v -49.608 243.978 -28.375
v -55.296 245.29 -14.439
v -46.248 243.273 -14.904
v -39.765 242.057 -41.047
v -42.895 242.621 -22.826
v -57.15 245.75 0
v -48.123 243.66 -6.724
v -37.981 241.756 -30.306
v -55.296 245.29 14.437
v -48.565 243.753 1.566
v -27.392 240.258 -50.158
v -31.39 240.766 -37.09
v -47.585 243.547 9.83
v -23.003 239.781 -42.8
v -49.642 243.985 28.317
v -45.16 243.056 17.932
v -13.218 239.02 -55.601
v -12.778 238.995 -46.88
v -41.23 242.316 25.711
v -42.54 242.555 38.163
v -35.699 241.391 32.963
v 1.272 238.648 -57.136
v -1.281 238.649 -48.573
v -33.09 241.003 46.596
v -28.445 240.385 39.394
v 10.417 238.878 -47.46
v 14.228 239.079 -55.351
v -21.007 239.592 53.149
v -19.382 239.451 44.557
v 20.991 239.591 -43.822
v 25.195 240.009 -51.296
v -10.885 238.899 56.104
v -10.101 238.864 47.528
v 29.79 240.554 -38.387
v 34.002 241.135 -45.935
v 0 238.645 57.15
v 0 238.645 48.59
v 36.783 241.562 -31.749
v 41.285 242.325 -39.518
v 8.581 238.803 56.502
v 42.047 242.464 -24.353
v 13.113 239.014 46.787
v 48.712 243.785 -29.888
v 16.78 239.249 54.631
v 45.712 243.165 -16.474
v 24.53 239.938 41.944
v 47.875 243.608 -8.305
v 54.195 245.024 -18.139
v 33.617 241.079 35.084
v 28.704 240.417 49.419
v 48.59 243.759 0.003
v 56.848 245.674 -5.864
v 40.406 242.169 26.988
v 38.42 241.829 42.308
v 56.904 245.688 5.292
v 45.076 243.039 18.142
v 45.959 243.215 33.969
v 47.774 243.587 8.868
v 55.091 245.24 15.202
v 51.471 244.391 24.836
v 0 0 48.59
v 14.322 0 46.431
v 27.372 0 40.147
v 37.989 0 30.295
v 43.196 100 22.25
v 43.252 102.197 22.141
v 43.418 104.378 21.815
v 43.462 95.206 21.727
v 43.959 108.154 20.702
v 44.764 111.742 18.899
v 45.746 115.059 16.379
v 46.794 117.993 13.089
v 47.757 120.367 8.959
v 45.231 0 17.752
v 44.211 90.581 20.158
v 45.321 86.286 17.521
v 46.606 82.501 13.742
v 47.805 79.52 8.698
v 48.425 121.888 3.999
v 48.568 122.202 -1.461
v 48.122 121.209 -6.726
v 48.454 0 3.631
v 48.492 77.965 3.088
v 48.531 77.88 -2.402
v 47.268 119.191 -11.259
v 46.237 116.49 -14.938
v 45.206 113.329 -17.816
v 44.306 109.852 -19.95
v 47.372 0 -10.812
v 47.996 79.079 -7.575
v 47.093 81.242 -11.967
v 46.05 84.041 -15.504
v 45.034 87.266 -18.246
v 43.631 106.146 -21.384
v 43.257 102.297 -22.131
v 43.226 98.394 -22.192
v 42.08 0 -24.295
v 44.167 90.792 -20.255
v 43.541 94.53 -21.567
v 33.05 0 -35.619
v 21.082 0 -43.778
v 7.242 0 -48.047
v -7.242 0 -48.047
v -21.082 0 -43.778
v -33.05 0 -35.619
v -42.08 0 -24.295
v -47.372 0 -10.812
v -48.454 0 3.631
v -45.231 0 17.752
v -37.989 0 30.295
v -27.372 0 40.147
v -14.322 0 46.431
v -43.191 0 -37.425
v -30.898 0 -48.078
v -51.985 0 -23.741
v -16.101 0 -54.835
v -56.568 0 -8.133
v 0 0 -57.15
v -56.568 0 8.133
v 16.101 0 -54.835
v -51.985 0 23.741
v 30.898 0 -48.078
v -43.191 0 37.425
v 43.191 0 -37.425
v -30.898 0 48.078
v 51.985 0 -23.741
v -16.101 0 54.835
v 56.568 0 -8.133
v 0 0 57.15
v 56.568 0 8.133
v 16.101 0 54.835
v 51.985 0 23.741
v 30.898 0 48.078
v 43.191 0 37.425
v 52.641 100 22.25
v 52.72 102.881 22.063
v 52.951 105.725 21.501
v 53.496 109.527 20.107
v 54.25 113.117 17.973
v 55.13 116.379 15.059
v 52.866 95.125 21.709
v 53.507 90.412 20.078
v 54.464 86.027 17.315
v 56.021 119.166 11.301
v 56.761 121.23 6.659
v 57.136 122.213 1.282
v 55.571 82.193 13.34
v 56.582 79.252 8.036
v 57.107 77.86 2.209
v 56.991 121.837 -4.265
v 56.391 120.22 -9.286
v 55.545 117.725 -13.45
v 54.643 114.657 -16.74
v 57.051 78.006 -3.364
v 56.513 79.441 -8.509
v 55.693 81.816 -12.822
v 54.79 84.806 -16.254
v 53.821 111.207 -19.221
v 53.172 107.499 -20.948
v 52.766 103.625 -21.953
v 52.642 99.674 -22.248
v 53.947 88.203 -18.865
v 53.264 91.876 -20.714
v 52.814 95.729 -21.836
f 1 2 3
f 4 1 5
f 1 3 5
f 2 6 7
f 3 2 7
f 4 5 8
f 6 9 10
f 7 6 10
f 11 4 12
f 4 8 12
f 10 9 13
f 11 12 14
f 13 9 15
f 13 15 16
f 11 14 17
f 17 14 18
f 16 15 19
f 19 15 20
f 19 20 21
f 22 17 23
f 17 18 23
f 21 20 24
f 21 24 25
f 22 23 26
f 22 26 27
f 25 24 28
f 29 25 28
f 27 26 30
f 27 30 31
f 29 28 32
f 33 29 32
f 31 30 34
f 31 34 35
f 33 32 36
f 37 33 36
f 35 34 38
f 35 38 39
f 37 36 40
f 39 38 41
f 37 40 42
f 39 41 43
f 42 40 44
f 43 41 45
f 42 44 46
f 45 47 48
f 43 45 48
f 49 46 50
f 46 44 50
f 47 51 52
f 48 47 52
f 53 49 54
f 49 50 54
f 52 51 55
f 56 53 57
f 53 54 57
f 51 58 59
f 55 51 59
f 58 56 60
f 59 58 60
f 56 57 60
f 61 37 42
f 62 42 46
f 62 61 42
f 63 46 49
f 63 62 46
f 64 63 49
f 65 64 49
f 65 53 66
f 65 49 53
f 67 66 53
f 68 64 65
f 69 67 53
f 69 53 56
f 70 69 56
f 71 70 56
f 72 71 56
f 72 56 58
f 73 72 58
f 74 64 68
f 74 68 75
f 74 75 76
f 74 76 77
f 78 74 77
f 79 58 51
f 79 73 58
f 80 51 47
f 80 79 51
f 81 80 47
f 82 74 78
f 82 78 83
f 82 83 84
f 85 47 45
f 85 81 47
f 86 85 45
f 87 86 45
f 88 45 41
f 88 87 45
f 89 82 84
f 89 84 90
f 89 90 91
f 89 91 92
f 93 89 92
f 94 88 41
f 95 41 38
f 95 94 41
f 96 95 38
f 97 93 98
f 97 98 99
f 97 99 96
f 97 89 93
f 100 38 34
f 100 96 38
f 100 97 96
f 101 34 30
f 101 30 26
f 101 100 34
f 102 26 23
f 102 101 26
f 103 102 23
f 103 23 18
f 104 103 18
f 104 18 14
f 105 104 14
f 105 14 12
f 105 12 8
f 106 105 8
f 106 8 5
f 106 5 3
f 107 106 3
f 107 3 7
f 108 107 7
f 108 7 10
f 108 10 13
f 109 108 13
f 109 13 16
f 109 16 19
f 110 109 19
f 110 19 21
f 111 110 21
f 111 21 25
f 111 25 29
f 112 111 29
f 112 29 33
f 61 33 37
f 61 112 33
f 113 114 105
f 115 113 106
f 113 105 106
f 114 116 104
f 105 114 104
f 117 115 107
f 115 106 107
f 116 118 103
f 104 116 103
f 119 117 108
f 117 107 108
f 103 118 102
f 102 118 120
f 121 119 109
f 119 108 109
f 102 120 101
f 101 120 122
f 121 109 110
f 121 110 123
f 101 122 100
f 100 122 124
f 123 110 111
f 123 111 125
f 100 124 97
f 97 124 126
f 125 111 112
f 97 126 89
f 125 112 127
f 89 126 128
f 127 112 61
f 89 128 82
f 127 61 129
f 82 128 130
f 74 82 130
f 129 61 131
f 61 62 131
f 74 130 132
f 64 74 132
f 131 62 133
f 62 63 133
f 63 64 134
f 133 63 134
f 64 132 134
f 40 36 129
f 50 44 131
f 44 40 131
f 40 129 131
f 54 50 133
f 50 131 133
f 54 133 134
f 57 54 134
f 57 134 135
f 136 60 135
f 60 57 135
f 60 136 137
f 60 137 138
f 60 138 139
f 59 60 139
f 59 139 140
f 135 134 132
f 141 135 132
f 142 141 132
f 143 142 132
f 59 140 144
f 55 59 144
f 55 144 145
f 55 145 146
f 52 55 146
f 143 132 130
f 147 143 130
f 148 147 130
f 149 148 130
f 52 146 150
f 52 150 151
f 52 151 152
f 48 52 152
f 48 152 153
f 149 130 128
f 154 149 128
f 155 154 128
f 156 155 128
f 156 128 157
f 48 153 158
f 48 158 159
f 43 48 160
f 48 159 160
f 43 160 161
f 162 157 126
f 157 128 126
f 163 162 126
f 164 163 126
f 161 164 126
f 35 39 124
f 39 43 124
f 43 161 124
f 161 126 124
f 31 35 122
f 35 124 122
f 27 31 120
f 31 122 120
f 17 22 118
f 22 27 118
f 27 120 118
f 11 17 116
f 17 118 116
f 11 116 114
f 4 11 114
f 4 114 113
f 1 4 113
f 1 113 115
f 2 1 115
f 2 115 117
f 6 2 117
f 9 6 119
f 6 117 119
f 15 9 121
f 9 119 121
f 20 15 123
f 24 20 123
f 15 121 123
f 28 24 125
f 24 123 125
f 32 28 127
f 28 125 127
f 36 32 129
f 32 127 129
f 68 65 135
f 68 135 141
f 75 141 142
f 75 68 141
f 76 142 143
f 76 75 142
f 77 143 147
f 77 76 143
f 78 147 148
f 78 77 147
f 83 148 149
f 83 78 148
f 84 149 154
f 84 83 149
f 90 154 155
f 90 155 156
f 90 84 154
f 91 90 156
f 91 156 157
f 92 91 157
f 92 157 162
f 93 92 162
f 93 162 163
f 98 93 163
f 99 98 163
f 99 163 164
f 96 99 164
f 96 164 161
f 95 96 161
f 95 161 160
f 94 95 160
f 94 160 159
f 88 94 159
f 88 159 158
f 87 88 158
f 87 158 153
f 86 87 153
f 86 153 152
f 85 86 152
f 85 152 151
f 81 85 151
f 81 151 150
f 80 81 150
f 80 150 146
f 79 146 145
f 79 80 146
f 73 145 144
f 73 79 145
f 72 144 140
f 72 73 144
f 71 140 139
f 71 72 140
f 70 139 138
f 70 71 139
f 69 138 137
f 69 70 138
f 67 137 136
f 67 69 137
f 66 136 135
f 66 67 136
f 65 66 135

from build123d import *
from OCP.BRepAlgoAPI import BRepAlgoAPI_Cut
from OCP.TopTools import TopTools_ListOfShape

# Parameters (mm, degrees)
SKETCH1_R               = 57.15
SKETCH1_R_2             = 48.59
BOSS_EXTRUDE1_DEPTH     = 245.75
CUT_EXTRUDE1_DEPTH      = 57.875
CUT_EXTRUDE2_REACH      = 260.699
CUT_EXTRUDE2_END_RADIUS = 57.15
SKETCH3_R               = 22.25


with BuildPart() as part:
    # Sketch1 → Boss-Extrude1 (new body)
    with BuildSketch(Plane(origin=(0, 0, 0), x_dir=(1, 0, 0), z_dir=(0, 1, 0))):
        with Locations(Location((0, 0, 0), (0, 0, 270))):
            Circle(SKETCH1_R)
        with Locations(Location((0, 0, 0), (0, 0, 270))):
            Circle(SKETCH1_R_2, mode=Mode.SUBTRACT)
    extrude(amount=BOSS_EXTRUDE1_DEPTH)


with BuildPart() as cut_extrude1_tool:
    # Sketch2 → Cut-Extrude1 (new, symmetric)
    with BuildSketch(Plane.XY):
        with BuildLine():
            Line((57.15, 245.75), (-57.15, 245.75))
            ThreePointArc((-57.15, 245.75), (0, 238.645023145), (57.15, 245.75))
        make_face()
    extrude(amount=CUT_EXTRUDE1_DEPTH, both=True)


with BuildPart() as part_1:
    add(part.part)

    # Cut-Extrude1: cut by cut_extrude1_tool, with a tolerance
    cut_extrude1_stock = TopTools_ListOfShape()
    cut_extrude1_stock.Append(part_1.part.wrapped)
    cut_extrude1_tools = TopTools_ListOfShape()
    cut_extrude1_tools.Append(cut_extrude1_tool.part.wrapped)
    cut_extrude1_cut = BRepAlgoAPI_Cut()
    cut_extrude1_cut.SetArguments(cut_extrude1_stock)
    cut_extrude1_cut.SetTools(cut_extrude1_tools)
    cut_extrude1_cut.SetFuzzyValue(0.00001)
    cut_extrude1_cut.Build()
    add(Compound.cast(cut_extrude1_cut.Shape()).solids(), mode=Mode.REPLACE)

    # Cut-Extrude2: up to this cylinder (the profile starts inside it)
    cut_extrude2_end = Plane(origin=(0, 100, 0), z_dir=(0, -1, 0)) * Cylinder(CUT_EXTRUDE2_END_RADIUS, 636.698, mode=Mode.PRIVATE)
    # Sketch3 → Cut-Extrude2 (cut, up to the surface)
    with BuildSketch(Plane(origin=(0, 0, 0), x_dir=(0, 0, -1), z_dir=(1, 0, 0)), mode=Mode.PRIVATE) as cut_extrude2_sk1:
        with Locations(Location((0, 100, 0), (0, 0, 180))):
            Circle(SKETCH3_R)
    cut_extrude2_tool1 = extrude(cut_extrude2_sk1.sketch, amount=CUT_EXTRUDE2_REACH, mode=Mode.PRIVATE) & cut_extrude2_end
    add(cut_extrude2_tool1.solids().sort_by_distance((0, 100, 0))[0], mode=Mode.SUBTRACT)


solid = part_1.part
